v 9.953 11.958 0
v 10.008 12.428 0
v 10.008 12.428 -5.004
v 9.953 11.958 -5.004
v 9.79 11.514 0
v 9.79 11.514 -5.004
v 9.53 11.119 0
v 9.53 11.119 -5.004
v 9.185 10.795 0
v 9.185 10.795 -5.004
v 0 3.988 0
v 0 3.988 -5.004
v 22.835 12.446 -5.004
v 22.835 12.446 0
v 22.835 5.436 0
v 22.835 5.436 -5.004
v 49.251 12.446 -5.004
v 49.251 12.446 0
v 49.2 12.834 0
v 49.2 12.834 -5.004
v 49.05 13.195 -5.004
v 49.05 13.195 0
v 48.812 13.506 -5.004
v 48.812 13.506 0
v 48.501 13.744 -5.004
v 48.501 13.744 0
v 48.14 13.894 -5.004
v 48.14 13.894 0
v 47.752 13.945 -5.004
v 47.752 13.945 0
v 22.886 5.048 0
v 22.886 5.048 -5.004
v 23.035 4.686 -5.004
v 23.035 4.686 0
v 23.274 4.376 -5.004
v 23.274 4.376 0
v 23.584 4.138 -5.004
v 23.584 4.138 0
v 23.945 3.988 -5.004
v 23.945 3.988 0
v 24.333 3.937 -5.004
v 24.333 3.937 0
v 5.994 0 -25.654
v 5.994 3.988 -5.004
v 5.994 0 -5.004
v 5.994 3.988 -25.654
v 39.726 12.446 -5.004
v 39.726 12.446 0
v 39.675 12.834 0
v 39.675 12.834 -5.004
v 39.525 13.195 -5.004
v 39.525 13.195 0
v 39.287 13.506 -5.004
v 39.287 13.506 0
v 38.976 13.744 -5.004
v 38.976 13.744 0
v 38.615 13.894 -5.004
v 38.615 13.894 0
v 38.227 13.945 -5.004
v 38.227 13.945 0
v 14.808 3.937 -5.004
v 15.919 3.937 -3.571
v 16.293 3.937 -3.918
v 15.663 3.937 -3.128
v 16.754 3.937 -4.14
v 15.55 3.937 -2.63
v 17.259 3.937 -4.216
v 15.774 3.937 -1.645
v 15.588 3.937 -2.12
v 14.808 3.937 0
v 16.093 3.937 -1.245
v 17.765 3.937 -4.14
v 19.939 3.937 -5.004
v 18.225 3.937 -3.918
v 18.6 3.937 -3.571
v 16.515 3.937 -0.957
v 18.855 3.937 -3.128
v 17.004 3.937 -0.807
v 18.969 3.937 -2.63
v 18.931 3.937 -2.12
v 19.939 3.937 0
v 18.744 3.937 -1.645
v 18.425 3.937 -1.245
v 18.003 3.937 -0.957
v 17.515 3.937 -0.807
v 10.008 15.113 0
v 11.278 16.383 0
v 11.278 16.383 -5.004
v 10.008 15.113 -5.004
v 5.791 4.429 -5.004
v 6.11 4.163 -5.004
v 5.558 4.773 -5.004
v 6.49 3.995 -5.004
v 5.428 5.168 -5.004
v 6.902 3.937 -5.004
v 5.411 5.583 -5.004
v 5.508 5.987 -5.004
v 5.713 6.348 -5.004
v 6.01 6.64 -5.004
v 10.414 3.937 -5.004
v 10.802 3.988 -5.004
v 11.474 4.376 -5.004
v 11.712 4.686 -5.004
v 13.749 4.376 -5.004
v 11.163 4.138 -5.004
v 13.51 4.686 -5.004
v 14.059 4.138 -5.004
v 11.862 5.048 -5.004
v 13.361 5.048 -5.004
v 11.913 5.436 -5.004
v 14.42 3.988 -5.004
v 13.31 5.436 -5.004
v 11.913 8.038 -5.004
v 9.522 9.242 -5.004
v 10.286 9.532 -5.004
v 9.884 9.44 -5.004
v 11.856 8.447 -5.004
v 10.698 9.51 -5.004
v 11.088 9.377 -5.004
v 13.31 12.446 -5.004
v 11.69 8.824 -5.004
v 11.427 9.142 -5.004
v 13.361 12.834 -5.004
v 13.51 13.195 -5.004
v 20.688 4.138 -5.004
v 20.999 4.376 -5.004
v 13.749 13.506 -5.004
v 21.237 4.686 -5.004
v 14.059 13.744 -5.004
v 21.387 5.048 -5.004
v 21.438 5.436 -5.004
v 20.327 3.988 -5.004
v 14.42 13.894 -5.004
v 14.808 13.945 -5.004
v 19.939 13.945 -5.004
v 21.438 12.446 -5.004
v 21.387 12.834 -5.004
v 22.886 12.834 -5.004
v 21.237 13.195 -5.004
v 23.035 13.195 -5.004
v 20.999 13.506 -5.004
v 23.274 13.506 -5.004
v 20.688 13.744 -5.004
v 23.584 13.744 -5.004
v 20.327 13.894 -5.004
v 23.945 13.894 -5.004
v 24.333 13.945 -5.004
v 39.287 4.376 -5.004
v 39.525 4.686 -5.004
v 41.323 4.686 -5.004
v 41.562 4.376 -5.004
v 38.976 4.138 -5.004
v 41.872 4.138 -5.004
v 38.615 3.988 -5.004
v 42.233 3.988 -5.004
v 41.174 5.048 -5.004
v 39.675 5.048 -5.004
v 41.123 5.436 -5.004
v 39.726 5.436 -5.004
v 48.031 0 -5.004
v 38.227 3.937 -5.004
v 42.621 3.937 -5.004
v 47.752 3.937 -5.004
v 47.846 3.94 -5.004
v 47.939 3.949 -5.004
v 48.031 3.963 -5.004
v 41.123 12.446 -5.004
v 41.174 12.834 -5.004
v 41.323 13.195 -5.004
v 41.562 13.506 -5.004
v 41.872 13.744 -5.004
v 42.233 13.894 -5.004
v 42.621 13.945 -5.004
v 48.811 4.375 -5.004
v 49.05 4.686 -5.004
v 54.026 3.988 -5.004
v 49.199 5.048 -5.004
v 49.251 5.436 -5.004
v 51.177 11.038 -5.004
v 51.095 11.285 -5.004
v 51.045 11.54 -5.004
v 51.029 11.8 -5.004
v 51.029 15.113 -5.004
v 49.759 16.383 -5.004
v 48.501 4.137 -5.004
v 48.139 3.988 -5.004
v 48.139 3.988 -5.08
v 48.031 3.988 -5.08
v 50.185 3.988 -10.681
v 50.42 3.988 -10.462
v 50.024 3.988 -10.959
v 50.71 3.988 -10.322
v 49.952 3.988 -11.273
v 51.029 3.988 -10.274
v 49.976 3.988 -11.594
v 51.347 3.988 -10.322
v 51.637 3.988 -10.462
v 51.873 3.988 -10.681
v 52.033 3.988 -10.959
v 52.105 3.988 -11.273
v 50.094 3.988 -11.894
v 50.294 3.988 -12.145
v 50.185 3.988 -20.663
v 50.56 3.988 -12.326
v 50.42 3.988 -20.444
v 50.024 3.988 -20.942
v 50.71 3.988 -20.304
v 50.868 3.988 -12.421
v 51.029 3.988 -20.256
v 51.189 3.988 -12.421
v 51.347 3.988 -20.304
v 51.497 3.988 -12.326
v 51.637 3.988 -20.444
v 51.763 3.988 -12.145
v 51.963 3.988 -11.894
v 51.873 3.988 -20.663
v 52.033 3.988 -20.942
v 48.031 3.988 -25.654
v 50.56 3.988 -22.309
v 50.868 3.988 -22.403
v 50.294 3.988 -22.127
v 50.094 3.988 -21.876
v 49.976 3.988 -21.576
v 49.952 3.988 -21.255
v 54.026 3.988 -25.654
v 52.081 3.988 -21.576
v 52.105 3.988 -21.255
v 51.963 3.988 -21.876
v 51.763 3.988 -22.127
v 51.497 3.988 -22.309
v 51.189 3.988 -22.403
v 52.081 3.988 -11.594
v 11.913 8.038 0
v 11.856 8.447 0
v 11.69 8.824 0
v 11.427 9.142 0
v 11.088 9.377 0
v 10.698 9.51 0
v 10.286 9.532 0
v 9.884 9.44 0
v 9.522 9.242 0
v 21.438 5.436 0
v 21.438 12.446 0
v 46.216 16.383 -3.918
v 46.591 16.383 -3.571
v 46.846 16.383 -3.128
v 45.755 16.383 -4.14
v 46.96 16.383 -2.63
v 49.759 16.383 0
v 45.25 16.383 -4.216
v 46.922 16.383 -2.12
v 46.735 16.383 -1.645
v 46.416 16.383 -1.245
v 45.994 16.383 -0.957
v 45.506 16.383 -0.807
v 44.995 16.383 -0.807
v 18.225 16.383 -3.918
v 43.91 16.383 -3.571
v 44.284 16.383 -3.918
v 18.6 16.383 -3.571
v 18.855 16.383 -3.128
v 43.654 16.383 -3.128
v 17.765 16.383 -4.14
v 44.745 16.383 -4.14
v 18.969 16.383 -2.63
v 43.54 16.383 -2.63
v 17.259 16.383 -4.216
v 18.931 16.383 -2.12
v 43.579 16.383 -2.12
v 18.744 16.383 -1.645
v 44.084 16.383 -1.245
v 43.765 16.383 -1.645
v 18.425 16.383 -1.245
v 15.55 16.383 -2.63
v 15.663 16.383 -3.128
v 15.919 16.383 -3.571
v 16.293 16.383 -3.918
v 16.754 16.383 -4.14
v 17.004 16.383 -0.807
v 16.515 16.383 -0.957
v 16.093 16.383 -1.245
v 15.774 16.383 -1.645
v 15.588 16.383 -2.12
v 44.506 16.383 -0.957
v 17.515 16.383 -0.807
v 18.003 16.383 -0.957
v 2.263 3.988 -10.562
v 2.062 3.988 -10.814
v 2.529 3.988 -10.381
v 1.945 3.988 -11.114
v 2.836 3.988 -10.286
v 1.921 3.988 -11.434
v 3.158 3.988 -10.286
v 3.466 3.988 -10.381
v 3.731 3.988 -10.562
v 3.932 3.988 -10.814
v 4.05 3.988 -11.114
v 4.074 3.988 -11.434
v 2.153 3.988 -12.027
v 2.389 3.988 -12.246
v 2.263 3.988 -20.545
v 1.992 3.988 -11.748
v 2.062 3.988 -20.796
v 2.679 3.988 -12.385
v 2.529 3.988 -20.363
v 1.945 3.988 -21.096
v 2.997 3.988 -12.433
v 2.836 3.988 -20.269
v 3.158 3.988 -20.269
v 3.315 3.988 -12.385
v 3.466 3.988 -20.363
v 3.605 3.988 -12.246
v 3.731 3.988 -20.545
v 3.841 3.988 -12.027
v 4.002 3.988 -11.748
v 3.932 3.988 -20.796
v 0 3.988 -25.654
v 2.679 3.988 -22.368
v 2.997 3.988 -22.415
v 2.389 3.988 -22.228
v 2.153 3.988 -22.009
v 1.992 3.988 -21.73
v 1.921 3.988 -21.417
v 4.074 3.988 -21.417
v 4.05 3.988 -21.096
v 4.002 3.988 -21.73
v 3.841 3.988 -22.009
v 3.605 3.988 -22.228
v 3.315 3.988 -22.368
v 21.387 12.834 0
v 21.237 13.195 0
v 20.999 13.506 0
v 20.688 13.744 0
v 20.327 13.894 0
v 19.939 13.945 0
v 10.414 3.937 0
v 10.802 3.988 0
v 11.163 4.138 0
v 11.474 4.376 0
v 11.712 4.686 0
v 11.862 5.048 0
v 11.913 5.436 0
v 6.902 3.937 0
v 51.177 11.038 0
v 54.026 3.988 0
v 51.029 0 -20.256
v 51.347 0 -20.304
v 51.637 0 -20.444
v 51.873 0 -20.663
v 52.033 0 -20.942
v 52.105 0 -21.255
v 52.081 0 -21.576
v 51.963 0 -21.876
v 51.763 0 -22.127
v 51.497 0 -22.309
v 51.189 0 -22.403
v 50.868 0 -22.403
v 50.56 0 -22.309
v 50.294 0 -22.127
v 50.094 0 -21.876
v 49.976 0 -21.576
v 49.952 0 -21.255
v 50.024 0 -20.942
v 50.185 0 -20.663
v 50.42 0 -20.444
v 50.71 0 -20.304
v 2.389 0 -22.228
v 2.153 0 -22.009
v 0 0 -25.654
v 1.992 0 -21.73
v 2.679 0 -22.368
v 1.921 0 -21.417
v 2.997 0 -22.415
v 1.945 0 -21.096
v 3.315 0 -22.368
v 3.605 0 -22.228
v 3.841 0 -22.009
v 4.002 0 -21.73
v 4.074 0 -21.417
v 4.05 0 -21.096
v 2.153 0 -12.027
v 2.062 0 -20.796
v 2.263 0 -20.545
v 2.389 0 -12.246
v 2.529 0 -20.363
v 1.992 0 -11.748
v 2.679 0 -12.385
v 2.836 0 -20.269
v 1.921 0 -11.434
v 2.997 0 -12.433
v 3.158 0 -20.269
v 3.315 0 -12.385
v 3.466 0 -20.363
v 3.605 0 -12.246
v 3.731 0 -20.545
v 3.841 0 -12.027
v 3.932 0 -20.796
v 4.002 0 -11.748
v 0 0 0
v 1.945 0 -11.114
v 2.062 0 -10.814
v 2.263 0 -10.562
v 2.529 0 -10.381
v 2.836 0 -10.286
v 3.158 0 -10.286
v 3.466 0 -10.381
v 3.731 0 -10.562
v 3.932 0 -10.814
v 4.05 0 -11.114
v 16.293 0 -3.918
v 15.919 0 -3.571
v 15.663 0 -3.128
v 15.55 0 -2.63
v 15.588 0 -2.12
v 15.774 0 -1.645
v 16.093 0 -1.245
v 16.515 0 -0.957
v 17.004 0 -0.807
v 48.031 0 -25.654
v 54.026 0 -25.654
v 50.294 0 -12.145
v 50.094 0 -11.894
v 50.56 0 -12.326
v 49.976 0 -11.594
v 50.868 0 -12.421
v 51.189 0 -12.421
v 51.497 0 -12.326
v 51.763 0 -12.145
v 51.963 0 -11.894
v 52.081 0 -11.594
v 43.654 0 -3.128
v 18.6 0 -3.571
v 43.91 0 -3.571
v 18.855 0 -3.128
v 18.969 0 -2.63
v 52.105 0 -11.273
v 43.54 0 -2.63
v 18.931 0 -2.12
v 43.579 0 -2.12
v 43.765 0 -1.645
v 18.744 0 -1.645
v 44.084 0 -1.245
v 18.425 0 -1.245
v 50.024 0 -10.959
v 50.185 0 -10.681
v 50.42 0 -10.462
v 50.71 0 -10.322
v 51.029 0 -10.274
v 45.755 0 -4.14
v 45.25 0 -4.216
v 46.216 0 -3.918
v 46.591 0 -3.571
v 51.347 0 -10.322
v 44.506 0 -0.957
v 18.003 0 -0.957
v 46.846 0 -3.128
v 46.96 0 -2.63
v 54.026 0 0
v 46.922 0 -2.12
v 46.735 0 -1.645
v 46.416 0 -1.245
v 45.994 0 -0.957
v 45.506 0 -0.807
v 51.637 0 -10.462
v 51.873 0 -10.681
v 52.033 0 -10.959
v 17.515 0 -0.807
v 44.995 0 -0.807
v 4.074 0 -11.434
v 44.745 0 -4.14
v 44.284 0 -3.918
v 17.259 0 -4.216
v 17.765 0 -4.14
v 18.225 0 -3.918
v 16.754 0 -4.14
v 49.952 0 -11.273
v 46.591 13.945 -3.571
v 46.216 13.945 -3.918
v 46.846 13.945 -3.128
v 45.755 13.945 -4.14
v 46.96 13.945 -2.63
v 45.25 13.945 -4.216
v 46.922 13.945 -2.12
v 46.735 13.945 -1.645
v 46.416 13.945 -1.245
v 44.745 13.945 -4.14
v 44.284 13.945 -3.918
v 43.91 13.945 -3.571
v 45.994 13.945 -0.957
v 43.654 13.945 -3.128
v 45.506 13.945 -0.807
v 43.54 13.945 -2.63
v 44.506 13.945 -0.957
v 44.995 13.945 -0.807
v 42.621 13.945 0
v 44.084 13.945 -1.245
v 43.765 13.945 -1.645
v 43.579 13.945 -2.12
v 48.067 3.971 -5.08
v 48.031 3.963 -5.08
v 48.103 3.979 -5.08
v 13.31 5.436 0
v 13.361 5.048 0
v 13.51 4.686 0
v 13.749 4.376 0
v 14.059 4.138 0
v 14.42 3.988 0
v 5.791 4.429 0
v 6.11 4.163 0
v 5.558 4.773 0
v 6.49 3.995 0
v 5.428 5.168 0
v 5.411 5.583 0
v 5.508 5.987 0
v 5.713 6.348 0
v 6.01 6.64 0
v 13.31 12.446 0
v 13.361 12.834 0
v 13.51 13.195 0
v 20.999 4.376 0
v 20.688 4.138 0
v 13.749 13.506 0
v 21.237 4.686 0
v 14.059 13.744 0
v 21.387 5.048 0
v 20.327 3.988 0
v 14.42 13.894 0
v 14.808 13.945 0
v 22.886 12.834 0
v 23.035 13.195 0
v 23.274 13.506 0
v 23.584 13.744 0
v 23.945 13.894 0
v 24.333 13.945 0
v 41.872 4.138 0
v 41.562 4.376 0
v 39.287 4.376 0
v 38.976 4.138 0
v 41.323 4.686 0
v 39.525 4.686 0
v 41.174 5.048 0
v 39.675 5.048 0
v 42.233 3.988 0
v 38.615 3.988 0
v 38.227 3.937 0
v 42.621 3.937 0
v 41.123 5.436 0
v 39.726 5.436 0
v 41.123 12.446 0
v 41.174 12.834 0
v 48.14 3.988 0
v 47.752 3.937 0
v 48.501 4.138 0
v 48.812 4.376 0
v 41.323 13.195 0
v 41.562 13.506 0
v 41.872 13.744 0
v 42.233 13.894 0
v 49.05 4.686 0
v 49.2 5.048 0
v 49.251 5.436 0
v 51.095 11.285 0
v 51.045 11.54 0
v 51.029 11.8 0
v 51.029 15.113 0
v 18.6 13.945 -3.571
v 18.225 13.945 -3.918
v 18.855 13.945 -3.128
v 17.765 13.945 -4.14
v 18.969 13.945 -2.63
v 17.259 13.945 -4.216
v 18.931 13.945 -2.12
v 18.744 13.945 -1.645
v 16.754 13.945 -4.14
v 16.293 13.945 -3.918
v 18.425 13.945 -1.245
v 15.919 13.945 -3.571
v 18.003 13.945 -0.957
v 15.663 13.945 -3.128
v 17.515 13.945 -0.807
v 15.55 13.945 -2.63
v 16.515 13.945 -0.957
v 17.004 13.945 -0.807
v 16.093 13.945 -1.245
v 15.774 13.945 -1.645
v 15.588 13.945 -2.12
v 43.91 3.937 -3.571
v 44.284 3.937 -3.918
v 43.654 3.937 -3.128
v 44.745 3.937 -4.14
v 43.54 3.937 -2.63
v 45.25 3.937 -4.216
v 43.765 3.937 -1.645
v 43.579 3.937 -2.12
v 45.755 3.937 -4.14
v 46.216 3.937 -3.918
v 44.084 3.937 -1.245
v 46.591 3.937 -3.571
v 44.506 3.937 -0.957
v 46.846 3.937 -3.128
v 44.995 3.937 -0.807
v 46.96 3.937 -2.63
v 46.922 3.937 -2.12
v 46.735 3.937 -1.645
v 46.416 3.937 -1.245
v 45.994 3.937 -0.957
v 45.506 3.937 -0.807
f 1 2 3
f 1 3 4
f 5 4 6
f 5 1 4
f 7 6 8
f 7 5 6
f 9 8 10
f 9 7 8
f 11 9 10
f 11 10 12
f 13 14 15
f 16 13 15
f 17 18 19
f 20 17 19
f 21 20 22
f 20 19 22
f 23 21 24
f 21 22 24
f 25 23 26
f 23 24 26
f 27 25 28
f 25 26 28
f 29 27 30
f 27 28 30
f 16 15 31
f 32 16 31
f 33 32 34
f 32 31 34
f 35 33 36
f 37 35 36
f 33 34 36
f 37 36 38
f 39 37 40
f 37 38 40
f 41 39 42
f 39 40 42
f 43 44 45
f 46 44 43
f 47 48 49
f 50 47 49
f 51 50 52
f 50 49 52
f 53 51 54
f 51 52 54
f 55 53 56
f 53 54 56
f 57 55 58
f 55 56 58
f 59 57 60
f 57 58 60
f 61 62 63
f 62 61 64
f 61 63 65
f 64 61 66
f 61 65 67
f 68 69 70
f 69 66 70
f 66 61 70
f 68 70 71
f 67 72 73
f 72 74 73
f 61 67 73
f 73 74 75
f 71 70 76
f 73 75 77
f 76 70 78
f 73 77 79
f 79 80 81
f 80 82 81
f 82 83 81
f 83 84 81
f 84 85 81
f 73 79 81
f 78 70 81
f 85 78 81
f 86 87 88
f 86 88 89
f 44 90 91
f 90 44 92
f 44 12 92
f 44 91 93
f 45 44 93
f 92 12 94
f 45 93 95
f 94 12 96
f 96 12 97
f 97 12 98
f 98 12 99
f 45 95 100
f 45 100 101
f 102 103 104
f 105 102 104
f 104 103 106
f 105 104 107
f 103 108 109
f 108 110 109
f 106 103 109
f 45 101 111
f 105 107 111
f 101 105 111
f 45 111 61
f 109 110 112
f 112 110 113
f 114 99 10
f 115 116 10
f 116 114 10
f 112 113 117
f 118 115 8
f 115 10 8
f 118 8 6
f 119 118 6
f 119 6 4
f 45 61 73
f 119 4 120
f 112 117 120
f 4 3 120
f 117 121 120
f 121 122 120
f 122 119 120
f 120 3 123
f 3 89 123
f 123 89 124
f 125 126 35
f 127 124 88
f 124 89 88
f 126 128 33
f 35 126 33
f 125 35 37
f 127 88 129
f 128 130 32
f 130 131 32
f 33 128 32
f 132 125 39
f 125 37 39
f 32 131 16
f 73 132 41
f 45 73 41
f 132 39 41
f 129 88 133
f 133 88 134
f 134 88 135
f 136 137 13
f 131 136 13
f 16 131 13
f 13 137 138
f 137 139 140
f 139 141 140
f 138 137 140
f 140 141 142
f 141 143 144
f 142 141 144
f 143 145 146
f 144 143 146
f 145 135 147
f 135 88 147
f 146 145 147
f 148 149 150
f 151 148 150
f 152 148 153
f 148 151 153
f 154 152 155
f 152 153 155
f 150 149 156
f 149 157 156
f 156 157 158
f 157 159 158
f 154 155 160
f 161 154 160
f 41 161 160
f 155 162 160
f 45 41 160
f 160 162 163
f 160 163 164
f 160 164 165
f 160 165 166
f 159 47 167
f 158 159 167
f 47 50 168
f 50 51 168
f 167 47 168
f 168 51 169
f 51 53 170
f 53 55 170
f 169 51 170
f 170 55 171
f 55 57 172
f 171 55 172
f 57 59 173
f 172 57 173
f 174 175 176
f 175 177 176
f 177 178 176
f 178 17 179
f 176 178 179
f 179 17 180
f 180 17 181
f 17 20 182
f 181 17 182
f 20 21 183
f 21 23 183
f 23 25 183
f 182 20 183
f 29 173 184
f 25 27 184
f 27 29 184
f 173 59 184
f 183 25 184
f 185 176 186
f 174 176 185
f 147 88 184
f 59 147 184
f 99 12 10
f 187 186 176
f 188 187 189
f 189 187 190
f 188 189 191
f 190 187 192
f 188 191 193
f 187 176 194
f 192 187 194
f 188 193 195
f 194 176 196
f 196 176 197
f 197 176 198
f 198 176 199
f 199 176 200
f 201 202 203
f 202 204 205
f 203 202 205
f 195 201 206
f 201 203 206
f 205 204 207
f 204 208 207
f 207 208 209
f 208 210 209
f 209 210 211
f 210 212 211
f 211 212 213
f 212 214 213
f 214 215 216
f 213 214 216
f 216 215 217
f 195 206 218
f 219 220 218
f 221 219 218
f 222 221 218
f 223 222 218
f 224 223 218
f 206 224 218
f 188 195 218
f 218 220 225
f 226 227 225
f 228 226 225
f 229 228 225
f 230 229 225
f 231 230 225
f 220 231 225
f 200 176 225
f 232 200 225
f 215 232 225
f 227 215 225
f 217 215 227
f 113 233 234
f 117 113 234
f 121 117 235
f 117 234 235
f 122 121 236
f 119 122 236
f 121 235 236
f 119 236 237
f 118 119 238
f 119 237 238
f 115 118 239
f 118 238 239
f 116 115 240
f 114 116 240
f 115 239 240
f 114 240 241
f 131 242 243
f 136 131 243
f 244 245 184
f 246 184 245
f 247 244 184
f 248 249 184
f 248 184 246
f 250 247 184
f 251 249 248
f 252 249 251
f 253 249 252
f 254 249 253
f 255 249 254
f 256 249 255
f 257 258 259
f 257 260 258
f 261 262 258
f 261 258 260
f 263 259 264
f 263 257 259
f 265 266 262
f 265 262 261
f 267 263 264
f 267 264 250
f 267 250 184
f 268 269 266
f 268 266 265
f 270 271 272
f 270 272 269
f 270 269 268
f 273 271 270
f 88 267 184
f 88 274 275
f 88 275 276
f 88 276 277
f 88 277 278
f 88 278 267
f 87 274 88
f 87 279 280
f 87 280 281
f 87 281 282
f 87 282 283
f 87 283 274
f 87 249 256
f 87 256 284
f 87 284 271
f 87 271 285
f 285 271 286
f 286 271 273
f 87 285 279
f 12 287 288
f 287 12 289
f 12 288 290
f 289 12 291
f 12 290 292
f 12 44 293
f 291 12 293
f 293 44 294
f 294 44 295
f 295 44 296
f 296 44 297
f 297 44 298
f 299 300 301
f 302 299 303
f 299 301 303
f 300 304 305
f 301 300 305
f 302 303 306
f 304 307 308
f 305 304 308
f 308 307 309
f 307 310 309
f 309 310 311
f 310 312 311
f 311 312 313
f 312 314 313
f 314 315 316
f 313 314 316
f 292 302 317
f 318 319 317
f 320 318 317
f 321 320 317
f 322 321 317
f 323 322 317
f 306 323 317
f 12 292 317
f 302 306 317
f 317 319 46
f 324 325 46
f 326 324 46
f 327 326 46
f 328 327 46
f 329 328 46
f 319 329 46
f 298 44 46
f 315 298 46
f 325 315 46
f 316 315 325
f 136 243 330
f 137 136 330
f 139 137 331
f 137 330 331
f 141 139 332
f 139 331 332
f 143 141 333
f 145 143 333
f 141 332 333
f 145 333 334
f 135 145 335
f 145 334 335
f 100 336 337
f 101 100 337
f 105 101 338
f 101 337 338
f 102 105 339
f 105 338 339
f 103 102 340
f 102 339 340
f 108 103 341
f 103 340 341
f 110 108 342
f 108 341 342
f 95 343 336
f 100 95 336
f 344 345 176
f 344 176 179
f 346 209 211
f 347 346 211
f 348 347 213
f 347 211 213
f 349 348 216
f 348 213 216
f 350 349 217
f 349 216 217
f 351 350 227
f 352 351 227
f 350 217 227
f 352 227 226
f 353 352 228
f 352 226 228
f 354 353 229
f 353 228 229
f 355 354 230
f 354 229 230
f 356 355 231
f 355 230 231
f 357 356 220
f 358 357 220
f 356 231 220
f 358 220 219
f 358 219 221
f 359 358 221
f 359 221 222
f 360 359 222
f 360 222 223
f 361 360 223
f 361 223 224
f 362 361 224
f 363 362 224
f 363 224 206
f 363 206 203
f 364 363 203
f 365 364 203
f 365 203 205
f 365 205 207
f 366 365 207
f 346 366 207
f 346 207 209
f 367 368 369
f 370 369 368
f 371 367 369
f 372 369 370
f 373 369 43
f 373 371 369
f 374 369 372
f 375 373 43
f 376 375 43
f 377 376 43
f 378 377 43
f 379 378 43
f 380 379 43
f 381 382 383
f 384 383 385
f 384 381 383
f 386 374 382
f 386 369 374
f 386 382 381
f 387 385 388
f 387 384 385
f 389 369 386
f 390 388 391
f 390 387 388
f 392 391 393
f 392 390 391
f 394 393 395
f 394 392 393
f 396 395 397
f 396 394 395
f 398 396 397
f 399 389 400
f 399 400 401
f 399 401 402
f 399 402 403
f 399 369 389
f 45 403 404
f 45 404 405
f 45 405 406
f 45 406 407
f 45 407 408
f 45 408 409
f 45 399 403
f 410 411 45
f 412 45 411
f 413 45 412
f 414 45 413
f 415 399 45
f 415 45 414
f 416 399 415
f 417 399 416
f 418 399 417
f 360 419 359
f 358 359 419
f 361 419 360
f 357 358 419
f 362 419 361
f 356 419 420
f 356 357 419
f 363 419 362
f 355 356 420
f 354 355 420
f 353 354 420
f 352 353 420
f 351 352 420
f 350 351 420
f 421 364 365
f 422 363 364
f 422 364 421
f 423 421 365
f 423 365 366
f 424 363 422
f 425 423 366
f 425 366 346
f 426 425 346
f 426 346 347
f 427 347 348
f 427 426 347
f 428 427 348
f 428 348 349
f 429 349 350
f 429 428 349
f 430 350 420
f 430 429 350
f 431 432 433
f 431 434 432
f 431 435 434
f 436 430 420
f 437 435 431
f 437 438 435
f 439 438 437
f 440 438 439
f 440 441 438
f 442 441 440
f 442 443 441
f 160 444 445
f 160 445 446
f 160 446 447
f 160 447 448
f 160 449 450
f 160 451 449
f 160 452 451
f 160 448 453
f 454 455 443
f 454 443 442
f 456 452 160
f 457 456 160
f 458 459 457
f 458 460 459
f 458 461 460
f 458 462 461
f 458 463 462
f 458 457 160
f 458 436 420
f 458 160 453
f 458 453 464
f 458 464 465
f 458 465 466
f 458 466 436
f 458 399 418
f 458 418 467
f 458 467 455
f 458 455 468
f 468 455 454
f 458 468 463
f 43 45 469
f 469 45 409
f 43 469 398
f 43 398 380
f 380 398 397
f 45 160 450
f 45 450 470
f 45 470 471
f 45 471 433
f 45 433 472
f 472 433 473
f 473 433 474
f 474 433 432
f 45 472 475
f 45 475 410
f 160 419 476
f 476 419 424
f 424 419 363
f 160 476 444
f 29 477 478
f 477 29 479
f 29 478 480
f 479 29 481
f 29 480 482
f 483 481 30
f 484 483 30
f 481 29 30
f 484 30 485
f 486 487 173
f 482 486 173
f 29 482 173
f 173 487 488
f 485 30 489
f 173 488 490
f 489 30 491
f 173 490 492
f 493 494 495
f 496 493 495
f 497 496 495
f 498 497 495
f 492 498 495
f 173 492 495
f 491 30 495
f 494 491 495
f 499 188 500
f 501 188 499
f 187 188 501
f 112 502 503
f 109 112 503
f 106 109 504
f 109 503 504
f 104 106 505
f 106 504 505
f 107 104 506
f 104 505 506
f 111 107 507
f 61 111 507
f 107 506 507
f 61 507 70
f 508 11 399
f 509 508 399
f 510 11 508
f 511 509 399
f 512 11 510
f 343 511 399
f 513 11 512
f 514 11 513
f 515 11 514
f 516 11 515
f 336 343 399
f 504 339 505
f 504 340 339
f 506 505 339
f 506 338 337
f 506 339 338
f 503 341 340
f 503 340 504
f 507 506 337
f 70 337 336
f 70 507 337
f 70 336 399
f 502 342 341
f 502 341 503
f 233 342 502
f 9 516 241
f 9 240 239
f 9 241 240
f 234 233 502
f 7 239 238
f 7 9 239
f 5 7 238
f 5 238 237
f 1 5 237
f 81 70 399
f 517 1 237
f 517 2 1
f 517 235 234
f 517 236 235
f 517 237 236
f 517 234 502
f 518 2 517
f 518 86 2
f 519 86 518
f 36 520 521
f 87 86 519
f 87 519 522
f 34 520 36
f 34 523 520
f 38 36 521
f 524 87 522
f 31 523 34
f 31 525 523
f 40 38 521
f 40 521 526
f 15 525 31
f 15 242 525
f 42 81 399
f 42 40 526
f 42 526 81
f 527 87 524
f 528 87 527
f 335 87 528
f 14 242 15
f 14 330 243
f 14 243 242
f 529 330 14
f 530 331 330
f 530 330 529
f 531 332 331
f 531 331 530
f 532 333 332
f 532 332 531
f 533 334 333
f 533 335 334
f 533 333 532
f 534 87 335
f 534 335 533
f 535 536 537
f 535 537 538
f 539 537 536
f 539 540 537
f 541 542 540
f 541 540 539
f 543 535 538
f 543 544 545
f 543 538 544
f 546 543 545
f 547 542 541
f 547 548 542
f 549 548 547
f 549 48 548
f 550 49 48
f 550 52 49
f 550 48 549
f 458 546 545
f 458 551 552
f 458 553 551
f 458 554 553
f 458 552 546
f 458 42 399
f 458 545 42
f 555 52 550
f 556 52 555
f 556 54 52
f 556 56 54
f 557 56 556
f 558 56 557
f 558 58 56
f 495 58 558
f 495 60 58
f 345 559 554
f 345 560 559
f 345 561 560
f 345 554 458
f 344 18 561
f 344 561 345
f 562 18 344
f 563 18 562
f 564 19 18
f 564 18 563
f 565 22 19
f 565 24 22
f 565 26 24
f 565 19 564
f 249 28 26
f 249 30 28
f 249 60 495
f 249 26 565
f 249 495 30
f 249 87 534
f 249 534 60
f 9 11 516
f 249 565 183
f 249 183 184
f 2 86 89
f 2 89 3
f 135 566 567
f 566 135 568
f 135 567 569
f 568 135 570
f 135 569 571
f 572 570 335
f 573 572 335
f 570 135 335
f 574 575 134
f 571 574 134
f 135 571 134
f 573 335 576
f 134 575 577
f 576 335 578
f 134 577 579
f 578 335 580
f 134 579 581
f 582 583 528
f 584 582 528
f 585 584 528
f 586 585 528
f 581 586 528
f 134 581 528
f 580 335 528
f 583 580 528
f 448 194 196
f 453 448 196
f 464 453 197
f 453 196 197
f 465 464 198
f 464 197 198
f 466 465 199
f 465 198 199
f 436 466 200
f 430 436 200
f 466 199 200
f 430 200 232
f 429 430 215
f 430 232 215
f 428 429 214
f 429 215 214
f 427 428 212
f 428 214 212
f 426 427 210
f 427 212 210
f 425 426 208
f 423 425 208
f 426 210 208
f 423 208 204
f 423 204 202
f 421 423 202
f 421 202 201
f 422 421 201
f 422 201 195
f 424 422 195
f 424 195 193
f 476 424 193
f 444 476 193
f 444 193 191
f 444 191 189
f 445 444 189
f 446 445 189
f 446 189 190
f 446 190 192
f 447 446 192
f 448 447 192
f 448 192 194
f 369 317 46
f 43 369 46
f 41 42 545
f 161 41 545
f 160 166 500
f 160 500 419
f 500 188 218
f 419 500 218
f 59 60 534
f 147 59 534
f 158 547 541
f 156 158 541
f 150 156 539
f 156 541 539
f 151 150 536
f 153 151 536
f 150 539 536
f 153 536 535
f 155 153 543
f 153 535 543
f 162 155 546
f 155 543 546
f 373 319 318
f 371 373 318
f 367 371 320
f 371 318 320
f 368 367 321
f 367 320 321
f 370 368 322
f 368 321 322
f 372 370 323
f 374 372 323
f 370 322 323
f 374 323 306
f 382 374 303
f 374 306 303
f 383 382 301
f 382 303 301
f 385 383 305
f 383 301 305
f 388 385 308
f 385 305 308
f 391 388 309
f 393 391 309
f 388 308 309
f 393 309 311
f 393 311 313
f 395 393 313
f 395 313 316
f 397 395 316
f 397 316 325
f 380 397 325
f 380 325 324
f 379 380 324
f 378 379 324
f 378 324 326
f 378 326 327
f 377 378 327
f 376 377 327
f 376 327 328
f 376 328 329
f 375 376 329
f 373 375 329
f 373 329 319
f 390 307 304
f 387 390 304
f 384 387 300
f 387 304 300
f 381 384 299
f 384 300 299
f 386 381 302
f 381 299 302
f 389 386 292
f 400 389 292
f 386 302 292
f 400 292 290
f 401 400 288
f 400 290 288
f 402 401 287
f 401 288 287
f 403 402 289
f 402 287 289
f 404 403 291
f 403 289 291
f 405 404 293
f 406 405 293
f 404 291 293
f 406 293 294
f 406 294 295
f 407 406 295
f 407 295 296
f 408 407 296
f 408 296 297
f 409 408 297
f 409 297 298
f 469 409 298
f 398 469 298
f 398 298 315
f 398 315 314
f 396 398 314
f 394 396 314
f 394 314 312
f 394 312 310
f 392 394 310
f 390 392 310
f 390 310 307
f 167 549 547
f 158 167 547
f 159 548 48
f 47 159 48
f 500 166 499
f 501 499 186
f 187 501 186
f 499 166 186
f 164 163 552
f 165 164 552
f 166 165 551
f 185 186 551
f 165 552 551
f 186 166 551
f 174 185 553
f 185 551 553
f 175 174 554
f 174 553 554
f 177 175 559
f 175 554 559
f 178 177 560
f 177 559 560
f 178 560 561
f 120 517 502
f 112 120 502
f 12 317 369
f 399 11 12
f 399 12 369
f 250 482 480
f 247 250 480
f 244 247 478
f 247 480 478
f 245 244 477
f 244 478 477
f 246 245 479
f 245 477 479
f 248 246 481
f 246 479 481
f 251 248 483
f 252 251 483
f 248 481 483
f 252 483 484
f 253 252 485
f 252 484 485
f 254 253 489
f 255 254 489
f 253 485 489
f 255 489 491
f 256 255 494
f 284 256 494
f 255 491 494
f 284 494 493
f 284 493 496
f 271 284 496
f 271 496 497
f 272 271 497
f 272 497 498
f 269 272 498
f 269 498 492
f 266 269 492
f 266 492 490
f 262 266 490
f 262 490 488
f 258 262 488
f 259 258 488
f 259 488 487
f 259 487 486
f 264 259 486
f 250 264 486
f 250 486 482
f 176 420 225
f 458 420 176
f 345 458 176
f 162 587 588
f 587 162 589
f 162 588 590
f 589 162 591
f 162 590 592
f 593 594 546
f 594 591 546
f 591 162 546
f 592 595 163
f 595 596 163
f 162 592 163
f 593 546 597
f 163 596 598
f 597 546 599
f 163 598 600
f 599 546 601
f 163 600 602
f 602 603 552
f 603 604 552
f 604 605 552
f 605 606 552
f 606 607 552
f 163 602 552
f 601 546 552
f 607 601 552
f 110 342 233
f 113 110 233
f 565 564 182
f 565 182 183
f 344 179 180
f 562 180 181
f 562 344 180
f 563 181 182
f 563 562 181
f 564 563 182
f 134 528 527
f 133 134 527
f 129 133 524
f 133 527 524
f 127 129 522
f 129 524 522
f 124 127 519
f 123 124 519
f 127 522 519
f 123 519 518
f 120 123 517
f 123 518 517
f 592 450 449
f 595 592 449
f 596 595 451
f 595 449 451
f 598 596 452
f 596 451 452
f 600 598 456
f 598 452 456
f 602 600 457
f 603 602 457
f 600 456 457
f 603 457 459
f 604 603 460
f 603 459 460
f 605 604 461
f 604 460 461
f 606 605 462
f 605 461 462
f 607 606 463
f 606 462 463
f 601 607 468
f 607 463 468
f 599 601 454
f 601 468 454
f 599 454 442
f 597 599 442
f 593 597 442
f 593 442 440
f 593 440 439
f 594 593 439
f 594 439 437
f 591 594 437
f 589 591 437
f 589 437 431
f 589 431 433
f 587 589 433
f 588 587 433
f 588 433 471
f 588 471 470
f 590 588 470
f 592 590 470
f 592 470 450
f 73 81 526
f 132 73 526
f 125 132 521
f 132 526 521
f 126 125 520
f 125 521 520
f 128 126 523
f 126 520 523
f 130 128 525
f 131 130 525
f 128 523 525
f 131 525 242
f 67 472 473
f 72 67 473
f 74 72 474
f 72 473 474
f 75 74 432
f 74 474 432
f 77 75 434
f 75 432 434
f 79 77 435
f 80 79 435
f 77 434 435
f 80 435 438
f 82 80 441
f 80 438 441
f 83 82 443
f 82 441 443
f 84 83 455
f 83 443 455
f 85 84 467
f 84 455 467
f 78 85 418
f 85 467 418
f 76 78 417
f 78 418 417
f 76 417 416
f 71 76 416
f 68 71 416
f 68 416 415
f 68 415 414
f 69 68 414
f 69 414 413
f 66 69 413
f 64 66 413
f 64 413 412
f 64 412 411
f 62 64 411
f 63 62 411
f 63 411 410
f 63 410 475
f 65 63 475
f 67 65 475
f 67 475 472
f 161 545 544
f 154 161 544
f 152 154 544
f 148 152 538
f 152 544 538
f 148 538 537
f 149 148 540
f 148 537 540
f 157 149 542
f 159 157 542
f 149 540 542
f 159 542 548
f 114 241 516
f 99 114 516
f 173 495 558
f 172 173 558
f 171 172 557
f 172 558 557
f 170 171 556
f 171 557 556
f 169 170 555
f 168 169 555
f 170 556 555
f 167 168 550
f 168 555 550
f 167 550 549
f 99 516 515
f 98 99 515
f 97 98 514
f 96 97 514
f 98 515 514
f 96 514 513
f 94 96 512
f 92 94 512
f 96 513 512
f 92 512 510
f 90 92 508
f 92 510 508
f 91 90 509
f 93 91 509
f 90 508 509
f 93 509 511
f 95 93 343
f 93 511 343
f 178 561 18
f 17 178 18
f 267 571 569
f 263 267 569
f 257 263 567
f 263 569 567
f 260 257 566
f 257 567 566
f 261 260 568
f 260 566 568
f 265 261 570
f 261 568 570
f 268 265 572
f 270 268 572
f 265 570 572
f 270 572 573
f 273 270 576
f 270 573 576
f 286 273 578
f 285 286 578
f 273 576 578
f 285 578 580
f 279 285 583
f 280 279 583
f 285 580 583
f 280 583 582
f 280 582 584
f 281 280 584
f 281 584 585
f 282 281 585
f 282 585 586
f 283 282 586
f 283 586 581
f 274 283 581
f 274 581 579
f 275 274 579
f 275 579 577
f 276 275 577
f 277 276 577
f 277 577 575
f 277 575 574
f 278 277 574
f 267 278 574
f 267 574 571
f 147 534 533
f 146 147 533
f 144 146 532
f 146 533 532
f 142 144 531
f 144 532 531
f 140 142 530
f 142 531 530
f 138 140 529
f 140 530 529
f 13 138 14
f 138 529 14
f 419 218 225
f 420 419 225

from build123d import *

# Parameters (mm, degrees)
BOSS_EXTRUDE1_DEPTH = 25.654
SKETCH2_W           = 20.6502
SKETCH2_H           = 12.3952
CUT_EXTRUDE1_DEPTH  = 63.010623853
SKETCH3_W           = 42.037
SKETCH3_H           = 20.6502
CUT_EXTRUDE2_DEPTH  = 62.078275718
CUT_EXTRUDE3_DEPTH  = 5.08
SKETCH5_R           = 1.0795
CUT_EXTRUDE4_DEPTH  = 62.078275718
SKETCH6_R           = 1.7145
CUT_EXTRUDE5_DEPTH  = 63.010623853


with BuildPart() as part:
    # Sketch1 → Boss-Extrude1 (new body)
    with BuildSketch(Plane.XY):
        with BuildLine():
            Line((0, 0), (54.0258, 0))
            Line((54.0258, 0), (54.0258, 3.9878))
            Line((54.0258, 3.9878), (51.176616962, 11.038320738))
            ThreePointArc((51.176616962, 11.038320738), (51.065947457, 11.411860999), (51.0286, 11.799656349))
            Line((51.0286, 11.799656349), (51.0286, 15.113))
            Line((51.0286, 15.113), (49.7586, 16.383))
            Line((49.7586, 16.383), (11.2776, 16.383))
            Line((11.2776, 16.383), (10.0076, 15.113))
            Line((10.0076, 15.113), (10.0076, 12.427861529))
            ThreePointArc((10.0076, 12.427861529), (9.790474401, 11.513938717), (9.185498713, 10.795326965))
            Line((9.185498713, 10.795326965), (0, 3.9878))
            Line((0, 3.9878), (0, 0))
        make_face()
    extrude(amount=-BOSS_EXTRUDE1_DEPTH)

    # Sketch2 → Cut-Extrude1 (cut, through all)
    with BuildSketch(Plane(origin=(54.0258, 0, 0), x_dir=(0, 0, -1), z_dir=(1, 0, 0))):
        with Locations((15.3289, 10.1854)):
            Rectangle(SKETCH2_W, SKETCH2_H)
    extrude(amount=-CUT_EXTRUDE1_DEPTH, mode=Mode.SUBTRACT)

    # Sketch3 → Cut-Extrude2 (cut, through all)
    with BuildSketch(Plane(origin=(0, 3.9878, 0), x_dir=(1, 0, 0), z_dir=(0, 1, 0))):
        with Locations((27.0129, 15.3289)):
            Rectangle(SKETCH3_W, SKETCH3_H)
    extrude(amount=-CUT_EXTRUDE2_DEPTH, mode=Mode.SUBTRACT)

    # Sketch4 → Cut-Extrude3 (cut)
    with BuildSketch(Plane.XY):
        with BuildLine():
            Line((6.901956547, 3.937), (10.414, 3.937))
            ThreePointArc((10.414, 3.937), (11.473670222, 4.375929778), (11.9126, 5.4356))
            Line((11.9126, 5.4356), (11.9126, 8.038434234))
            ThreePointArc((11.9126, 8.038434234), (11.088018074, 9.376904105), (9.521699699, 9.242428475))
            Line((9.521699699, 9.242428475), (6.009656246, 6.639594241))
            ThreePointArc((6.009656246, 6.639594241), (5.478912674, 4.965761629), (6.901956547, 3.937))
        make_face()
        with BuildLine():
            Line((47.752, 13.9446), (42.6212, 13.9446))
            ThreePointArc((42.6212, 13.9446), (41.561529778, 13.505670222), (41.1226, 12.446))
            Line((41.1226, 12.446), (41.1226, 5.4356))
            ThreePointArc((41.1226, 5.4356), (41.561529778, 4.375929778), (42.6212, 3.937))
            Line((42.6212, 3.937), (47.752, 3.937))
            ThreePointArc((47.752, 3.937), (48.811670222, 4.375929778), (49.2506, 5.4356))
            Line((49.2506, 5.4356), (49.2506, 12.446))
            ThreePointArc((49.2506, 12.446), (48.811670222, 13.505670222), (47.752, 13.9446))
        make_face()
        with BuildLine():
            Line((13.3096, 12.446), (13.3096, 5.4356))
            ThreePointArc((13.3096, 5.4356), (13.748529778, 4.375929778), (14.8082, 3.937))
            Line((14.8082, 3.937), (19.939, 3.937))
            ThreePointArc((19.939, 3.937), (20.998670222, 4.375929778), (21.4376, 5.4356))
            Line((21.4376, 5.4356), (21.4376, 12.446))
            ThreePointArc((21.4376, 12.446), (20.998670222, 13.505670222), (19.939, 13.9446))
            Line((19.939, 13.9446), (14.8082, 13.9446))
            ThreePointArc((14.8082, 13.9446), (13.748529778, 13.505670222), (13.3096, 12.446))
        make_face()
        with BuildLine():
            Line((22.8346, 12.446), (22.8346, 5.4356))
            ThreePointArc((22.8346, 5.4356), (23.273529778, 4.375929778), (24.3332, 3.937))
            Line((24.3332, 3.937), (38.227, 3.937))
            ThreePointArc((38.227, 3.937), (39.286670222, 4.375929778), (39.7256, 5.4356))
            Line((39.7256, 5.4356), (39.7256, 12.446))
            ThreePointArc((39.7256, 12.446), (39.286670222, 13.505670222), (38.227, 13.9446))
            Line((38.227, 13.9446), (24.3332, 13.9446))
            ThreePointArc((24.3332, 13.9446), (23.273529778, 13.505670222), (22.8346, 12.446))
        make_face()
    extrude(amount=-CUT_EXTRUDE3_DEPTH, mode=Mode.SUBTRACT)

    # Sketch5 → Cut-Extrude4 (cut, through all)
    with BuildSketch(Plane(origin=(0, 3.9878, 0), x_dir=(1, 0, 0), z_dir=(0, 1, 0))):
        with Locations(Location((51.0286, 21.336, 0), (0, 0, 270))):
            Circle(SKETCH5_R)
        with Locations(Location((51.0286, 11.3538, 0), (0, 0, 270))):
            Circle(SKETCH5_R)
        with Locations(Location((2.9972, 11.3538, 0), (0, 0, 90))):
            Circle(SKETCH5_R)
        with Locations(Location((2.9972, 21.336, 0), (0, 0, 90))):
            Circle(SKETCH5_R)
    extrude(amount=-CUT_EXTRUDE4_DEPTH, mode=Mode.SUBTRACT)

    # Sketch6 → Cut-Extrude5 (cut, through all)
    with BuildSketch(Plane.XZ):
        with Locations(Location((45.2501, -2.5019, 0), (0, 0, 270))):
            Circle(SKETCH6_R)
        with Locations(Location((17.2593, -2.5019, 0), (0, 0, 270))):
            Circle(SKETCH6_R)
    extrude(amount=-CUT_EXTRUDE5_DEPTH, mode=Mode.SUBTRACT)


solid = part.part
